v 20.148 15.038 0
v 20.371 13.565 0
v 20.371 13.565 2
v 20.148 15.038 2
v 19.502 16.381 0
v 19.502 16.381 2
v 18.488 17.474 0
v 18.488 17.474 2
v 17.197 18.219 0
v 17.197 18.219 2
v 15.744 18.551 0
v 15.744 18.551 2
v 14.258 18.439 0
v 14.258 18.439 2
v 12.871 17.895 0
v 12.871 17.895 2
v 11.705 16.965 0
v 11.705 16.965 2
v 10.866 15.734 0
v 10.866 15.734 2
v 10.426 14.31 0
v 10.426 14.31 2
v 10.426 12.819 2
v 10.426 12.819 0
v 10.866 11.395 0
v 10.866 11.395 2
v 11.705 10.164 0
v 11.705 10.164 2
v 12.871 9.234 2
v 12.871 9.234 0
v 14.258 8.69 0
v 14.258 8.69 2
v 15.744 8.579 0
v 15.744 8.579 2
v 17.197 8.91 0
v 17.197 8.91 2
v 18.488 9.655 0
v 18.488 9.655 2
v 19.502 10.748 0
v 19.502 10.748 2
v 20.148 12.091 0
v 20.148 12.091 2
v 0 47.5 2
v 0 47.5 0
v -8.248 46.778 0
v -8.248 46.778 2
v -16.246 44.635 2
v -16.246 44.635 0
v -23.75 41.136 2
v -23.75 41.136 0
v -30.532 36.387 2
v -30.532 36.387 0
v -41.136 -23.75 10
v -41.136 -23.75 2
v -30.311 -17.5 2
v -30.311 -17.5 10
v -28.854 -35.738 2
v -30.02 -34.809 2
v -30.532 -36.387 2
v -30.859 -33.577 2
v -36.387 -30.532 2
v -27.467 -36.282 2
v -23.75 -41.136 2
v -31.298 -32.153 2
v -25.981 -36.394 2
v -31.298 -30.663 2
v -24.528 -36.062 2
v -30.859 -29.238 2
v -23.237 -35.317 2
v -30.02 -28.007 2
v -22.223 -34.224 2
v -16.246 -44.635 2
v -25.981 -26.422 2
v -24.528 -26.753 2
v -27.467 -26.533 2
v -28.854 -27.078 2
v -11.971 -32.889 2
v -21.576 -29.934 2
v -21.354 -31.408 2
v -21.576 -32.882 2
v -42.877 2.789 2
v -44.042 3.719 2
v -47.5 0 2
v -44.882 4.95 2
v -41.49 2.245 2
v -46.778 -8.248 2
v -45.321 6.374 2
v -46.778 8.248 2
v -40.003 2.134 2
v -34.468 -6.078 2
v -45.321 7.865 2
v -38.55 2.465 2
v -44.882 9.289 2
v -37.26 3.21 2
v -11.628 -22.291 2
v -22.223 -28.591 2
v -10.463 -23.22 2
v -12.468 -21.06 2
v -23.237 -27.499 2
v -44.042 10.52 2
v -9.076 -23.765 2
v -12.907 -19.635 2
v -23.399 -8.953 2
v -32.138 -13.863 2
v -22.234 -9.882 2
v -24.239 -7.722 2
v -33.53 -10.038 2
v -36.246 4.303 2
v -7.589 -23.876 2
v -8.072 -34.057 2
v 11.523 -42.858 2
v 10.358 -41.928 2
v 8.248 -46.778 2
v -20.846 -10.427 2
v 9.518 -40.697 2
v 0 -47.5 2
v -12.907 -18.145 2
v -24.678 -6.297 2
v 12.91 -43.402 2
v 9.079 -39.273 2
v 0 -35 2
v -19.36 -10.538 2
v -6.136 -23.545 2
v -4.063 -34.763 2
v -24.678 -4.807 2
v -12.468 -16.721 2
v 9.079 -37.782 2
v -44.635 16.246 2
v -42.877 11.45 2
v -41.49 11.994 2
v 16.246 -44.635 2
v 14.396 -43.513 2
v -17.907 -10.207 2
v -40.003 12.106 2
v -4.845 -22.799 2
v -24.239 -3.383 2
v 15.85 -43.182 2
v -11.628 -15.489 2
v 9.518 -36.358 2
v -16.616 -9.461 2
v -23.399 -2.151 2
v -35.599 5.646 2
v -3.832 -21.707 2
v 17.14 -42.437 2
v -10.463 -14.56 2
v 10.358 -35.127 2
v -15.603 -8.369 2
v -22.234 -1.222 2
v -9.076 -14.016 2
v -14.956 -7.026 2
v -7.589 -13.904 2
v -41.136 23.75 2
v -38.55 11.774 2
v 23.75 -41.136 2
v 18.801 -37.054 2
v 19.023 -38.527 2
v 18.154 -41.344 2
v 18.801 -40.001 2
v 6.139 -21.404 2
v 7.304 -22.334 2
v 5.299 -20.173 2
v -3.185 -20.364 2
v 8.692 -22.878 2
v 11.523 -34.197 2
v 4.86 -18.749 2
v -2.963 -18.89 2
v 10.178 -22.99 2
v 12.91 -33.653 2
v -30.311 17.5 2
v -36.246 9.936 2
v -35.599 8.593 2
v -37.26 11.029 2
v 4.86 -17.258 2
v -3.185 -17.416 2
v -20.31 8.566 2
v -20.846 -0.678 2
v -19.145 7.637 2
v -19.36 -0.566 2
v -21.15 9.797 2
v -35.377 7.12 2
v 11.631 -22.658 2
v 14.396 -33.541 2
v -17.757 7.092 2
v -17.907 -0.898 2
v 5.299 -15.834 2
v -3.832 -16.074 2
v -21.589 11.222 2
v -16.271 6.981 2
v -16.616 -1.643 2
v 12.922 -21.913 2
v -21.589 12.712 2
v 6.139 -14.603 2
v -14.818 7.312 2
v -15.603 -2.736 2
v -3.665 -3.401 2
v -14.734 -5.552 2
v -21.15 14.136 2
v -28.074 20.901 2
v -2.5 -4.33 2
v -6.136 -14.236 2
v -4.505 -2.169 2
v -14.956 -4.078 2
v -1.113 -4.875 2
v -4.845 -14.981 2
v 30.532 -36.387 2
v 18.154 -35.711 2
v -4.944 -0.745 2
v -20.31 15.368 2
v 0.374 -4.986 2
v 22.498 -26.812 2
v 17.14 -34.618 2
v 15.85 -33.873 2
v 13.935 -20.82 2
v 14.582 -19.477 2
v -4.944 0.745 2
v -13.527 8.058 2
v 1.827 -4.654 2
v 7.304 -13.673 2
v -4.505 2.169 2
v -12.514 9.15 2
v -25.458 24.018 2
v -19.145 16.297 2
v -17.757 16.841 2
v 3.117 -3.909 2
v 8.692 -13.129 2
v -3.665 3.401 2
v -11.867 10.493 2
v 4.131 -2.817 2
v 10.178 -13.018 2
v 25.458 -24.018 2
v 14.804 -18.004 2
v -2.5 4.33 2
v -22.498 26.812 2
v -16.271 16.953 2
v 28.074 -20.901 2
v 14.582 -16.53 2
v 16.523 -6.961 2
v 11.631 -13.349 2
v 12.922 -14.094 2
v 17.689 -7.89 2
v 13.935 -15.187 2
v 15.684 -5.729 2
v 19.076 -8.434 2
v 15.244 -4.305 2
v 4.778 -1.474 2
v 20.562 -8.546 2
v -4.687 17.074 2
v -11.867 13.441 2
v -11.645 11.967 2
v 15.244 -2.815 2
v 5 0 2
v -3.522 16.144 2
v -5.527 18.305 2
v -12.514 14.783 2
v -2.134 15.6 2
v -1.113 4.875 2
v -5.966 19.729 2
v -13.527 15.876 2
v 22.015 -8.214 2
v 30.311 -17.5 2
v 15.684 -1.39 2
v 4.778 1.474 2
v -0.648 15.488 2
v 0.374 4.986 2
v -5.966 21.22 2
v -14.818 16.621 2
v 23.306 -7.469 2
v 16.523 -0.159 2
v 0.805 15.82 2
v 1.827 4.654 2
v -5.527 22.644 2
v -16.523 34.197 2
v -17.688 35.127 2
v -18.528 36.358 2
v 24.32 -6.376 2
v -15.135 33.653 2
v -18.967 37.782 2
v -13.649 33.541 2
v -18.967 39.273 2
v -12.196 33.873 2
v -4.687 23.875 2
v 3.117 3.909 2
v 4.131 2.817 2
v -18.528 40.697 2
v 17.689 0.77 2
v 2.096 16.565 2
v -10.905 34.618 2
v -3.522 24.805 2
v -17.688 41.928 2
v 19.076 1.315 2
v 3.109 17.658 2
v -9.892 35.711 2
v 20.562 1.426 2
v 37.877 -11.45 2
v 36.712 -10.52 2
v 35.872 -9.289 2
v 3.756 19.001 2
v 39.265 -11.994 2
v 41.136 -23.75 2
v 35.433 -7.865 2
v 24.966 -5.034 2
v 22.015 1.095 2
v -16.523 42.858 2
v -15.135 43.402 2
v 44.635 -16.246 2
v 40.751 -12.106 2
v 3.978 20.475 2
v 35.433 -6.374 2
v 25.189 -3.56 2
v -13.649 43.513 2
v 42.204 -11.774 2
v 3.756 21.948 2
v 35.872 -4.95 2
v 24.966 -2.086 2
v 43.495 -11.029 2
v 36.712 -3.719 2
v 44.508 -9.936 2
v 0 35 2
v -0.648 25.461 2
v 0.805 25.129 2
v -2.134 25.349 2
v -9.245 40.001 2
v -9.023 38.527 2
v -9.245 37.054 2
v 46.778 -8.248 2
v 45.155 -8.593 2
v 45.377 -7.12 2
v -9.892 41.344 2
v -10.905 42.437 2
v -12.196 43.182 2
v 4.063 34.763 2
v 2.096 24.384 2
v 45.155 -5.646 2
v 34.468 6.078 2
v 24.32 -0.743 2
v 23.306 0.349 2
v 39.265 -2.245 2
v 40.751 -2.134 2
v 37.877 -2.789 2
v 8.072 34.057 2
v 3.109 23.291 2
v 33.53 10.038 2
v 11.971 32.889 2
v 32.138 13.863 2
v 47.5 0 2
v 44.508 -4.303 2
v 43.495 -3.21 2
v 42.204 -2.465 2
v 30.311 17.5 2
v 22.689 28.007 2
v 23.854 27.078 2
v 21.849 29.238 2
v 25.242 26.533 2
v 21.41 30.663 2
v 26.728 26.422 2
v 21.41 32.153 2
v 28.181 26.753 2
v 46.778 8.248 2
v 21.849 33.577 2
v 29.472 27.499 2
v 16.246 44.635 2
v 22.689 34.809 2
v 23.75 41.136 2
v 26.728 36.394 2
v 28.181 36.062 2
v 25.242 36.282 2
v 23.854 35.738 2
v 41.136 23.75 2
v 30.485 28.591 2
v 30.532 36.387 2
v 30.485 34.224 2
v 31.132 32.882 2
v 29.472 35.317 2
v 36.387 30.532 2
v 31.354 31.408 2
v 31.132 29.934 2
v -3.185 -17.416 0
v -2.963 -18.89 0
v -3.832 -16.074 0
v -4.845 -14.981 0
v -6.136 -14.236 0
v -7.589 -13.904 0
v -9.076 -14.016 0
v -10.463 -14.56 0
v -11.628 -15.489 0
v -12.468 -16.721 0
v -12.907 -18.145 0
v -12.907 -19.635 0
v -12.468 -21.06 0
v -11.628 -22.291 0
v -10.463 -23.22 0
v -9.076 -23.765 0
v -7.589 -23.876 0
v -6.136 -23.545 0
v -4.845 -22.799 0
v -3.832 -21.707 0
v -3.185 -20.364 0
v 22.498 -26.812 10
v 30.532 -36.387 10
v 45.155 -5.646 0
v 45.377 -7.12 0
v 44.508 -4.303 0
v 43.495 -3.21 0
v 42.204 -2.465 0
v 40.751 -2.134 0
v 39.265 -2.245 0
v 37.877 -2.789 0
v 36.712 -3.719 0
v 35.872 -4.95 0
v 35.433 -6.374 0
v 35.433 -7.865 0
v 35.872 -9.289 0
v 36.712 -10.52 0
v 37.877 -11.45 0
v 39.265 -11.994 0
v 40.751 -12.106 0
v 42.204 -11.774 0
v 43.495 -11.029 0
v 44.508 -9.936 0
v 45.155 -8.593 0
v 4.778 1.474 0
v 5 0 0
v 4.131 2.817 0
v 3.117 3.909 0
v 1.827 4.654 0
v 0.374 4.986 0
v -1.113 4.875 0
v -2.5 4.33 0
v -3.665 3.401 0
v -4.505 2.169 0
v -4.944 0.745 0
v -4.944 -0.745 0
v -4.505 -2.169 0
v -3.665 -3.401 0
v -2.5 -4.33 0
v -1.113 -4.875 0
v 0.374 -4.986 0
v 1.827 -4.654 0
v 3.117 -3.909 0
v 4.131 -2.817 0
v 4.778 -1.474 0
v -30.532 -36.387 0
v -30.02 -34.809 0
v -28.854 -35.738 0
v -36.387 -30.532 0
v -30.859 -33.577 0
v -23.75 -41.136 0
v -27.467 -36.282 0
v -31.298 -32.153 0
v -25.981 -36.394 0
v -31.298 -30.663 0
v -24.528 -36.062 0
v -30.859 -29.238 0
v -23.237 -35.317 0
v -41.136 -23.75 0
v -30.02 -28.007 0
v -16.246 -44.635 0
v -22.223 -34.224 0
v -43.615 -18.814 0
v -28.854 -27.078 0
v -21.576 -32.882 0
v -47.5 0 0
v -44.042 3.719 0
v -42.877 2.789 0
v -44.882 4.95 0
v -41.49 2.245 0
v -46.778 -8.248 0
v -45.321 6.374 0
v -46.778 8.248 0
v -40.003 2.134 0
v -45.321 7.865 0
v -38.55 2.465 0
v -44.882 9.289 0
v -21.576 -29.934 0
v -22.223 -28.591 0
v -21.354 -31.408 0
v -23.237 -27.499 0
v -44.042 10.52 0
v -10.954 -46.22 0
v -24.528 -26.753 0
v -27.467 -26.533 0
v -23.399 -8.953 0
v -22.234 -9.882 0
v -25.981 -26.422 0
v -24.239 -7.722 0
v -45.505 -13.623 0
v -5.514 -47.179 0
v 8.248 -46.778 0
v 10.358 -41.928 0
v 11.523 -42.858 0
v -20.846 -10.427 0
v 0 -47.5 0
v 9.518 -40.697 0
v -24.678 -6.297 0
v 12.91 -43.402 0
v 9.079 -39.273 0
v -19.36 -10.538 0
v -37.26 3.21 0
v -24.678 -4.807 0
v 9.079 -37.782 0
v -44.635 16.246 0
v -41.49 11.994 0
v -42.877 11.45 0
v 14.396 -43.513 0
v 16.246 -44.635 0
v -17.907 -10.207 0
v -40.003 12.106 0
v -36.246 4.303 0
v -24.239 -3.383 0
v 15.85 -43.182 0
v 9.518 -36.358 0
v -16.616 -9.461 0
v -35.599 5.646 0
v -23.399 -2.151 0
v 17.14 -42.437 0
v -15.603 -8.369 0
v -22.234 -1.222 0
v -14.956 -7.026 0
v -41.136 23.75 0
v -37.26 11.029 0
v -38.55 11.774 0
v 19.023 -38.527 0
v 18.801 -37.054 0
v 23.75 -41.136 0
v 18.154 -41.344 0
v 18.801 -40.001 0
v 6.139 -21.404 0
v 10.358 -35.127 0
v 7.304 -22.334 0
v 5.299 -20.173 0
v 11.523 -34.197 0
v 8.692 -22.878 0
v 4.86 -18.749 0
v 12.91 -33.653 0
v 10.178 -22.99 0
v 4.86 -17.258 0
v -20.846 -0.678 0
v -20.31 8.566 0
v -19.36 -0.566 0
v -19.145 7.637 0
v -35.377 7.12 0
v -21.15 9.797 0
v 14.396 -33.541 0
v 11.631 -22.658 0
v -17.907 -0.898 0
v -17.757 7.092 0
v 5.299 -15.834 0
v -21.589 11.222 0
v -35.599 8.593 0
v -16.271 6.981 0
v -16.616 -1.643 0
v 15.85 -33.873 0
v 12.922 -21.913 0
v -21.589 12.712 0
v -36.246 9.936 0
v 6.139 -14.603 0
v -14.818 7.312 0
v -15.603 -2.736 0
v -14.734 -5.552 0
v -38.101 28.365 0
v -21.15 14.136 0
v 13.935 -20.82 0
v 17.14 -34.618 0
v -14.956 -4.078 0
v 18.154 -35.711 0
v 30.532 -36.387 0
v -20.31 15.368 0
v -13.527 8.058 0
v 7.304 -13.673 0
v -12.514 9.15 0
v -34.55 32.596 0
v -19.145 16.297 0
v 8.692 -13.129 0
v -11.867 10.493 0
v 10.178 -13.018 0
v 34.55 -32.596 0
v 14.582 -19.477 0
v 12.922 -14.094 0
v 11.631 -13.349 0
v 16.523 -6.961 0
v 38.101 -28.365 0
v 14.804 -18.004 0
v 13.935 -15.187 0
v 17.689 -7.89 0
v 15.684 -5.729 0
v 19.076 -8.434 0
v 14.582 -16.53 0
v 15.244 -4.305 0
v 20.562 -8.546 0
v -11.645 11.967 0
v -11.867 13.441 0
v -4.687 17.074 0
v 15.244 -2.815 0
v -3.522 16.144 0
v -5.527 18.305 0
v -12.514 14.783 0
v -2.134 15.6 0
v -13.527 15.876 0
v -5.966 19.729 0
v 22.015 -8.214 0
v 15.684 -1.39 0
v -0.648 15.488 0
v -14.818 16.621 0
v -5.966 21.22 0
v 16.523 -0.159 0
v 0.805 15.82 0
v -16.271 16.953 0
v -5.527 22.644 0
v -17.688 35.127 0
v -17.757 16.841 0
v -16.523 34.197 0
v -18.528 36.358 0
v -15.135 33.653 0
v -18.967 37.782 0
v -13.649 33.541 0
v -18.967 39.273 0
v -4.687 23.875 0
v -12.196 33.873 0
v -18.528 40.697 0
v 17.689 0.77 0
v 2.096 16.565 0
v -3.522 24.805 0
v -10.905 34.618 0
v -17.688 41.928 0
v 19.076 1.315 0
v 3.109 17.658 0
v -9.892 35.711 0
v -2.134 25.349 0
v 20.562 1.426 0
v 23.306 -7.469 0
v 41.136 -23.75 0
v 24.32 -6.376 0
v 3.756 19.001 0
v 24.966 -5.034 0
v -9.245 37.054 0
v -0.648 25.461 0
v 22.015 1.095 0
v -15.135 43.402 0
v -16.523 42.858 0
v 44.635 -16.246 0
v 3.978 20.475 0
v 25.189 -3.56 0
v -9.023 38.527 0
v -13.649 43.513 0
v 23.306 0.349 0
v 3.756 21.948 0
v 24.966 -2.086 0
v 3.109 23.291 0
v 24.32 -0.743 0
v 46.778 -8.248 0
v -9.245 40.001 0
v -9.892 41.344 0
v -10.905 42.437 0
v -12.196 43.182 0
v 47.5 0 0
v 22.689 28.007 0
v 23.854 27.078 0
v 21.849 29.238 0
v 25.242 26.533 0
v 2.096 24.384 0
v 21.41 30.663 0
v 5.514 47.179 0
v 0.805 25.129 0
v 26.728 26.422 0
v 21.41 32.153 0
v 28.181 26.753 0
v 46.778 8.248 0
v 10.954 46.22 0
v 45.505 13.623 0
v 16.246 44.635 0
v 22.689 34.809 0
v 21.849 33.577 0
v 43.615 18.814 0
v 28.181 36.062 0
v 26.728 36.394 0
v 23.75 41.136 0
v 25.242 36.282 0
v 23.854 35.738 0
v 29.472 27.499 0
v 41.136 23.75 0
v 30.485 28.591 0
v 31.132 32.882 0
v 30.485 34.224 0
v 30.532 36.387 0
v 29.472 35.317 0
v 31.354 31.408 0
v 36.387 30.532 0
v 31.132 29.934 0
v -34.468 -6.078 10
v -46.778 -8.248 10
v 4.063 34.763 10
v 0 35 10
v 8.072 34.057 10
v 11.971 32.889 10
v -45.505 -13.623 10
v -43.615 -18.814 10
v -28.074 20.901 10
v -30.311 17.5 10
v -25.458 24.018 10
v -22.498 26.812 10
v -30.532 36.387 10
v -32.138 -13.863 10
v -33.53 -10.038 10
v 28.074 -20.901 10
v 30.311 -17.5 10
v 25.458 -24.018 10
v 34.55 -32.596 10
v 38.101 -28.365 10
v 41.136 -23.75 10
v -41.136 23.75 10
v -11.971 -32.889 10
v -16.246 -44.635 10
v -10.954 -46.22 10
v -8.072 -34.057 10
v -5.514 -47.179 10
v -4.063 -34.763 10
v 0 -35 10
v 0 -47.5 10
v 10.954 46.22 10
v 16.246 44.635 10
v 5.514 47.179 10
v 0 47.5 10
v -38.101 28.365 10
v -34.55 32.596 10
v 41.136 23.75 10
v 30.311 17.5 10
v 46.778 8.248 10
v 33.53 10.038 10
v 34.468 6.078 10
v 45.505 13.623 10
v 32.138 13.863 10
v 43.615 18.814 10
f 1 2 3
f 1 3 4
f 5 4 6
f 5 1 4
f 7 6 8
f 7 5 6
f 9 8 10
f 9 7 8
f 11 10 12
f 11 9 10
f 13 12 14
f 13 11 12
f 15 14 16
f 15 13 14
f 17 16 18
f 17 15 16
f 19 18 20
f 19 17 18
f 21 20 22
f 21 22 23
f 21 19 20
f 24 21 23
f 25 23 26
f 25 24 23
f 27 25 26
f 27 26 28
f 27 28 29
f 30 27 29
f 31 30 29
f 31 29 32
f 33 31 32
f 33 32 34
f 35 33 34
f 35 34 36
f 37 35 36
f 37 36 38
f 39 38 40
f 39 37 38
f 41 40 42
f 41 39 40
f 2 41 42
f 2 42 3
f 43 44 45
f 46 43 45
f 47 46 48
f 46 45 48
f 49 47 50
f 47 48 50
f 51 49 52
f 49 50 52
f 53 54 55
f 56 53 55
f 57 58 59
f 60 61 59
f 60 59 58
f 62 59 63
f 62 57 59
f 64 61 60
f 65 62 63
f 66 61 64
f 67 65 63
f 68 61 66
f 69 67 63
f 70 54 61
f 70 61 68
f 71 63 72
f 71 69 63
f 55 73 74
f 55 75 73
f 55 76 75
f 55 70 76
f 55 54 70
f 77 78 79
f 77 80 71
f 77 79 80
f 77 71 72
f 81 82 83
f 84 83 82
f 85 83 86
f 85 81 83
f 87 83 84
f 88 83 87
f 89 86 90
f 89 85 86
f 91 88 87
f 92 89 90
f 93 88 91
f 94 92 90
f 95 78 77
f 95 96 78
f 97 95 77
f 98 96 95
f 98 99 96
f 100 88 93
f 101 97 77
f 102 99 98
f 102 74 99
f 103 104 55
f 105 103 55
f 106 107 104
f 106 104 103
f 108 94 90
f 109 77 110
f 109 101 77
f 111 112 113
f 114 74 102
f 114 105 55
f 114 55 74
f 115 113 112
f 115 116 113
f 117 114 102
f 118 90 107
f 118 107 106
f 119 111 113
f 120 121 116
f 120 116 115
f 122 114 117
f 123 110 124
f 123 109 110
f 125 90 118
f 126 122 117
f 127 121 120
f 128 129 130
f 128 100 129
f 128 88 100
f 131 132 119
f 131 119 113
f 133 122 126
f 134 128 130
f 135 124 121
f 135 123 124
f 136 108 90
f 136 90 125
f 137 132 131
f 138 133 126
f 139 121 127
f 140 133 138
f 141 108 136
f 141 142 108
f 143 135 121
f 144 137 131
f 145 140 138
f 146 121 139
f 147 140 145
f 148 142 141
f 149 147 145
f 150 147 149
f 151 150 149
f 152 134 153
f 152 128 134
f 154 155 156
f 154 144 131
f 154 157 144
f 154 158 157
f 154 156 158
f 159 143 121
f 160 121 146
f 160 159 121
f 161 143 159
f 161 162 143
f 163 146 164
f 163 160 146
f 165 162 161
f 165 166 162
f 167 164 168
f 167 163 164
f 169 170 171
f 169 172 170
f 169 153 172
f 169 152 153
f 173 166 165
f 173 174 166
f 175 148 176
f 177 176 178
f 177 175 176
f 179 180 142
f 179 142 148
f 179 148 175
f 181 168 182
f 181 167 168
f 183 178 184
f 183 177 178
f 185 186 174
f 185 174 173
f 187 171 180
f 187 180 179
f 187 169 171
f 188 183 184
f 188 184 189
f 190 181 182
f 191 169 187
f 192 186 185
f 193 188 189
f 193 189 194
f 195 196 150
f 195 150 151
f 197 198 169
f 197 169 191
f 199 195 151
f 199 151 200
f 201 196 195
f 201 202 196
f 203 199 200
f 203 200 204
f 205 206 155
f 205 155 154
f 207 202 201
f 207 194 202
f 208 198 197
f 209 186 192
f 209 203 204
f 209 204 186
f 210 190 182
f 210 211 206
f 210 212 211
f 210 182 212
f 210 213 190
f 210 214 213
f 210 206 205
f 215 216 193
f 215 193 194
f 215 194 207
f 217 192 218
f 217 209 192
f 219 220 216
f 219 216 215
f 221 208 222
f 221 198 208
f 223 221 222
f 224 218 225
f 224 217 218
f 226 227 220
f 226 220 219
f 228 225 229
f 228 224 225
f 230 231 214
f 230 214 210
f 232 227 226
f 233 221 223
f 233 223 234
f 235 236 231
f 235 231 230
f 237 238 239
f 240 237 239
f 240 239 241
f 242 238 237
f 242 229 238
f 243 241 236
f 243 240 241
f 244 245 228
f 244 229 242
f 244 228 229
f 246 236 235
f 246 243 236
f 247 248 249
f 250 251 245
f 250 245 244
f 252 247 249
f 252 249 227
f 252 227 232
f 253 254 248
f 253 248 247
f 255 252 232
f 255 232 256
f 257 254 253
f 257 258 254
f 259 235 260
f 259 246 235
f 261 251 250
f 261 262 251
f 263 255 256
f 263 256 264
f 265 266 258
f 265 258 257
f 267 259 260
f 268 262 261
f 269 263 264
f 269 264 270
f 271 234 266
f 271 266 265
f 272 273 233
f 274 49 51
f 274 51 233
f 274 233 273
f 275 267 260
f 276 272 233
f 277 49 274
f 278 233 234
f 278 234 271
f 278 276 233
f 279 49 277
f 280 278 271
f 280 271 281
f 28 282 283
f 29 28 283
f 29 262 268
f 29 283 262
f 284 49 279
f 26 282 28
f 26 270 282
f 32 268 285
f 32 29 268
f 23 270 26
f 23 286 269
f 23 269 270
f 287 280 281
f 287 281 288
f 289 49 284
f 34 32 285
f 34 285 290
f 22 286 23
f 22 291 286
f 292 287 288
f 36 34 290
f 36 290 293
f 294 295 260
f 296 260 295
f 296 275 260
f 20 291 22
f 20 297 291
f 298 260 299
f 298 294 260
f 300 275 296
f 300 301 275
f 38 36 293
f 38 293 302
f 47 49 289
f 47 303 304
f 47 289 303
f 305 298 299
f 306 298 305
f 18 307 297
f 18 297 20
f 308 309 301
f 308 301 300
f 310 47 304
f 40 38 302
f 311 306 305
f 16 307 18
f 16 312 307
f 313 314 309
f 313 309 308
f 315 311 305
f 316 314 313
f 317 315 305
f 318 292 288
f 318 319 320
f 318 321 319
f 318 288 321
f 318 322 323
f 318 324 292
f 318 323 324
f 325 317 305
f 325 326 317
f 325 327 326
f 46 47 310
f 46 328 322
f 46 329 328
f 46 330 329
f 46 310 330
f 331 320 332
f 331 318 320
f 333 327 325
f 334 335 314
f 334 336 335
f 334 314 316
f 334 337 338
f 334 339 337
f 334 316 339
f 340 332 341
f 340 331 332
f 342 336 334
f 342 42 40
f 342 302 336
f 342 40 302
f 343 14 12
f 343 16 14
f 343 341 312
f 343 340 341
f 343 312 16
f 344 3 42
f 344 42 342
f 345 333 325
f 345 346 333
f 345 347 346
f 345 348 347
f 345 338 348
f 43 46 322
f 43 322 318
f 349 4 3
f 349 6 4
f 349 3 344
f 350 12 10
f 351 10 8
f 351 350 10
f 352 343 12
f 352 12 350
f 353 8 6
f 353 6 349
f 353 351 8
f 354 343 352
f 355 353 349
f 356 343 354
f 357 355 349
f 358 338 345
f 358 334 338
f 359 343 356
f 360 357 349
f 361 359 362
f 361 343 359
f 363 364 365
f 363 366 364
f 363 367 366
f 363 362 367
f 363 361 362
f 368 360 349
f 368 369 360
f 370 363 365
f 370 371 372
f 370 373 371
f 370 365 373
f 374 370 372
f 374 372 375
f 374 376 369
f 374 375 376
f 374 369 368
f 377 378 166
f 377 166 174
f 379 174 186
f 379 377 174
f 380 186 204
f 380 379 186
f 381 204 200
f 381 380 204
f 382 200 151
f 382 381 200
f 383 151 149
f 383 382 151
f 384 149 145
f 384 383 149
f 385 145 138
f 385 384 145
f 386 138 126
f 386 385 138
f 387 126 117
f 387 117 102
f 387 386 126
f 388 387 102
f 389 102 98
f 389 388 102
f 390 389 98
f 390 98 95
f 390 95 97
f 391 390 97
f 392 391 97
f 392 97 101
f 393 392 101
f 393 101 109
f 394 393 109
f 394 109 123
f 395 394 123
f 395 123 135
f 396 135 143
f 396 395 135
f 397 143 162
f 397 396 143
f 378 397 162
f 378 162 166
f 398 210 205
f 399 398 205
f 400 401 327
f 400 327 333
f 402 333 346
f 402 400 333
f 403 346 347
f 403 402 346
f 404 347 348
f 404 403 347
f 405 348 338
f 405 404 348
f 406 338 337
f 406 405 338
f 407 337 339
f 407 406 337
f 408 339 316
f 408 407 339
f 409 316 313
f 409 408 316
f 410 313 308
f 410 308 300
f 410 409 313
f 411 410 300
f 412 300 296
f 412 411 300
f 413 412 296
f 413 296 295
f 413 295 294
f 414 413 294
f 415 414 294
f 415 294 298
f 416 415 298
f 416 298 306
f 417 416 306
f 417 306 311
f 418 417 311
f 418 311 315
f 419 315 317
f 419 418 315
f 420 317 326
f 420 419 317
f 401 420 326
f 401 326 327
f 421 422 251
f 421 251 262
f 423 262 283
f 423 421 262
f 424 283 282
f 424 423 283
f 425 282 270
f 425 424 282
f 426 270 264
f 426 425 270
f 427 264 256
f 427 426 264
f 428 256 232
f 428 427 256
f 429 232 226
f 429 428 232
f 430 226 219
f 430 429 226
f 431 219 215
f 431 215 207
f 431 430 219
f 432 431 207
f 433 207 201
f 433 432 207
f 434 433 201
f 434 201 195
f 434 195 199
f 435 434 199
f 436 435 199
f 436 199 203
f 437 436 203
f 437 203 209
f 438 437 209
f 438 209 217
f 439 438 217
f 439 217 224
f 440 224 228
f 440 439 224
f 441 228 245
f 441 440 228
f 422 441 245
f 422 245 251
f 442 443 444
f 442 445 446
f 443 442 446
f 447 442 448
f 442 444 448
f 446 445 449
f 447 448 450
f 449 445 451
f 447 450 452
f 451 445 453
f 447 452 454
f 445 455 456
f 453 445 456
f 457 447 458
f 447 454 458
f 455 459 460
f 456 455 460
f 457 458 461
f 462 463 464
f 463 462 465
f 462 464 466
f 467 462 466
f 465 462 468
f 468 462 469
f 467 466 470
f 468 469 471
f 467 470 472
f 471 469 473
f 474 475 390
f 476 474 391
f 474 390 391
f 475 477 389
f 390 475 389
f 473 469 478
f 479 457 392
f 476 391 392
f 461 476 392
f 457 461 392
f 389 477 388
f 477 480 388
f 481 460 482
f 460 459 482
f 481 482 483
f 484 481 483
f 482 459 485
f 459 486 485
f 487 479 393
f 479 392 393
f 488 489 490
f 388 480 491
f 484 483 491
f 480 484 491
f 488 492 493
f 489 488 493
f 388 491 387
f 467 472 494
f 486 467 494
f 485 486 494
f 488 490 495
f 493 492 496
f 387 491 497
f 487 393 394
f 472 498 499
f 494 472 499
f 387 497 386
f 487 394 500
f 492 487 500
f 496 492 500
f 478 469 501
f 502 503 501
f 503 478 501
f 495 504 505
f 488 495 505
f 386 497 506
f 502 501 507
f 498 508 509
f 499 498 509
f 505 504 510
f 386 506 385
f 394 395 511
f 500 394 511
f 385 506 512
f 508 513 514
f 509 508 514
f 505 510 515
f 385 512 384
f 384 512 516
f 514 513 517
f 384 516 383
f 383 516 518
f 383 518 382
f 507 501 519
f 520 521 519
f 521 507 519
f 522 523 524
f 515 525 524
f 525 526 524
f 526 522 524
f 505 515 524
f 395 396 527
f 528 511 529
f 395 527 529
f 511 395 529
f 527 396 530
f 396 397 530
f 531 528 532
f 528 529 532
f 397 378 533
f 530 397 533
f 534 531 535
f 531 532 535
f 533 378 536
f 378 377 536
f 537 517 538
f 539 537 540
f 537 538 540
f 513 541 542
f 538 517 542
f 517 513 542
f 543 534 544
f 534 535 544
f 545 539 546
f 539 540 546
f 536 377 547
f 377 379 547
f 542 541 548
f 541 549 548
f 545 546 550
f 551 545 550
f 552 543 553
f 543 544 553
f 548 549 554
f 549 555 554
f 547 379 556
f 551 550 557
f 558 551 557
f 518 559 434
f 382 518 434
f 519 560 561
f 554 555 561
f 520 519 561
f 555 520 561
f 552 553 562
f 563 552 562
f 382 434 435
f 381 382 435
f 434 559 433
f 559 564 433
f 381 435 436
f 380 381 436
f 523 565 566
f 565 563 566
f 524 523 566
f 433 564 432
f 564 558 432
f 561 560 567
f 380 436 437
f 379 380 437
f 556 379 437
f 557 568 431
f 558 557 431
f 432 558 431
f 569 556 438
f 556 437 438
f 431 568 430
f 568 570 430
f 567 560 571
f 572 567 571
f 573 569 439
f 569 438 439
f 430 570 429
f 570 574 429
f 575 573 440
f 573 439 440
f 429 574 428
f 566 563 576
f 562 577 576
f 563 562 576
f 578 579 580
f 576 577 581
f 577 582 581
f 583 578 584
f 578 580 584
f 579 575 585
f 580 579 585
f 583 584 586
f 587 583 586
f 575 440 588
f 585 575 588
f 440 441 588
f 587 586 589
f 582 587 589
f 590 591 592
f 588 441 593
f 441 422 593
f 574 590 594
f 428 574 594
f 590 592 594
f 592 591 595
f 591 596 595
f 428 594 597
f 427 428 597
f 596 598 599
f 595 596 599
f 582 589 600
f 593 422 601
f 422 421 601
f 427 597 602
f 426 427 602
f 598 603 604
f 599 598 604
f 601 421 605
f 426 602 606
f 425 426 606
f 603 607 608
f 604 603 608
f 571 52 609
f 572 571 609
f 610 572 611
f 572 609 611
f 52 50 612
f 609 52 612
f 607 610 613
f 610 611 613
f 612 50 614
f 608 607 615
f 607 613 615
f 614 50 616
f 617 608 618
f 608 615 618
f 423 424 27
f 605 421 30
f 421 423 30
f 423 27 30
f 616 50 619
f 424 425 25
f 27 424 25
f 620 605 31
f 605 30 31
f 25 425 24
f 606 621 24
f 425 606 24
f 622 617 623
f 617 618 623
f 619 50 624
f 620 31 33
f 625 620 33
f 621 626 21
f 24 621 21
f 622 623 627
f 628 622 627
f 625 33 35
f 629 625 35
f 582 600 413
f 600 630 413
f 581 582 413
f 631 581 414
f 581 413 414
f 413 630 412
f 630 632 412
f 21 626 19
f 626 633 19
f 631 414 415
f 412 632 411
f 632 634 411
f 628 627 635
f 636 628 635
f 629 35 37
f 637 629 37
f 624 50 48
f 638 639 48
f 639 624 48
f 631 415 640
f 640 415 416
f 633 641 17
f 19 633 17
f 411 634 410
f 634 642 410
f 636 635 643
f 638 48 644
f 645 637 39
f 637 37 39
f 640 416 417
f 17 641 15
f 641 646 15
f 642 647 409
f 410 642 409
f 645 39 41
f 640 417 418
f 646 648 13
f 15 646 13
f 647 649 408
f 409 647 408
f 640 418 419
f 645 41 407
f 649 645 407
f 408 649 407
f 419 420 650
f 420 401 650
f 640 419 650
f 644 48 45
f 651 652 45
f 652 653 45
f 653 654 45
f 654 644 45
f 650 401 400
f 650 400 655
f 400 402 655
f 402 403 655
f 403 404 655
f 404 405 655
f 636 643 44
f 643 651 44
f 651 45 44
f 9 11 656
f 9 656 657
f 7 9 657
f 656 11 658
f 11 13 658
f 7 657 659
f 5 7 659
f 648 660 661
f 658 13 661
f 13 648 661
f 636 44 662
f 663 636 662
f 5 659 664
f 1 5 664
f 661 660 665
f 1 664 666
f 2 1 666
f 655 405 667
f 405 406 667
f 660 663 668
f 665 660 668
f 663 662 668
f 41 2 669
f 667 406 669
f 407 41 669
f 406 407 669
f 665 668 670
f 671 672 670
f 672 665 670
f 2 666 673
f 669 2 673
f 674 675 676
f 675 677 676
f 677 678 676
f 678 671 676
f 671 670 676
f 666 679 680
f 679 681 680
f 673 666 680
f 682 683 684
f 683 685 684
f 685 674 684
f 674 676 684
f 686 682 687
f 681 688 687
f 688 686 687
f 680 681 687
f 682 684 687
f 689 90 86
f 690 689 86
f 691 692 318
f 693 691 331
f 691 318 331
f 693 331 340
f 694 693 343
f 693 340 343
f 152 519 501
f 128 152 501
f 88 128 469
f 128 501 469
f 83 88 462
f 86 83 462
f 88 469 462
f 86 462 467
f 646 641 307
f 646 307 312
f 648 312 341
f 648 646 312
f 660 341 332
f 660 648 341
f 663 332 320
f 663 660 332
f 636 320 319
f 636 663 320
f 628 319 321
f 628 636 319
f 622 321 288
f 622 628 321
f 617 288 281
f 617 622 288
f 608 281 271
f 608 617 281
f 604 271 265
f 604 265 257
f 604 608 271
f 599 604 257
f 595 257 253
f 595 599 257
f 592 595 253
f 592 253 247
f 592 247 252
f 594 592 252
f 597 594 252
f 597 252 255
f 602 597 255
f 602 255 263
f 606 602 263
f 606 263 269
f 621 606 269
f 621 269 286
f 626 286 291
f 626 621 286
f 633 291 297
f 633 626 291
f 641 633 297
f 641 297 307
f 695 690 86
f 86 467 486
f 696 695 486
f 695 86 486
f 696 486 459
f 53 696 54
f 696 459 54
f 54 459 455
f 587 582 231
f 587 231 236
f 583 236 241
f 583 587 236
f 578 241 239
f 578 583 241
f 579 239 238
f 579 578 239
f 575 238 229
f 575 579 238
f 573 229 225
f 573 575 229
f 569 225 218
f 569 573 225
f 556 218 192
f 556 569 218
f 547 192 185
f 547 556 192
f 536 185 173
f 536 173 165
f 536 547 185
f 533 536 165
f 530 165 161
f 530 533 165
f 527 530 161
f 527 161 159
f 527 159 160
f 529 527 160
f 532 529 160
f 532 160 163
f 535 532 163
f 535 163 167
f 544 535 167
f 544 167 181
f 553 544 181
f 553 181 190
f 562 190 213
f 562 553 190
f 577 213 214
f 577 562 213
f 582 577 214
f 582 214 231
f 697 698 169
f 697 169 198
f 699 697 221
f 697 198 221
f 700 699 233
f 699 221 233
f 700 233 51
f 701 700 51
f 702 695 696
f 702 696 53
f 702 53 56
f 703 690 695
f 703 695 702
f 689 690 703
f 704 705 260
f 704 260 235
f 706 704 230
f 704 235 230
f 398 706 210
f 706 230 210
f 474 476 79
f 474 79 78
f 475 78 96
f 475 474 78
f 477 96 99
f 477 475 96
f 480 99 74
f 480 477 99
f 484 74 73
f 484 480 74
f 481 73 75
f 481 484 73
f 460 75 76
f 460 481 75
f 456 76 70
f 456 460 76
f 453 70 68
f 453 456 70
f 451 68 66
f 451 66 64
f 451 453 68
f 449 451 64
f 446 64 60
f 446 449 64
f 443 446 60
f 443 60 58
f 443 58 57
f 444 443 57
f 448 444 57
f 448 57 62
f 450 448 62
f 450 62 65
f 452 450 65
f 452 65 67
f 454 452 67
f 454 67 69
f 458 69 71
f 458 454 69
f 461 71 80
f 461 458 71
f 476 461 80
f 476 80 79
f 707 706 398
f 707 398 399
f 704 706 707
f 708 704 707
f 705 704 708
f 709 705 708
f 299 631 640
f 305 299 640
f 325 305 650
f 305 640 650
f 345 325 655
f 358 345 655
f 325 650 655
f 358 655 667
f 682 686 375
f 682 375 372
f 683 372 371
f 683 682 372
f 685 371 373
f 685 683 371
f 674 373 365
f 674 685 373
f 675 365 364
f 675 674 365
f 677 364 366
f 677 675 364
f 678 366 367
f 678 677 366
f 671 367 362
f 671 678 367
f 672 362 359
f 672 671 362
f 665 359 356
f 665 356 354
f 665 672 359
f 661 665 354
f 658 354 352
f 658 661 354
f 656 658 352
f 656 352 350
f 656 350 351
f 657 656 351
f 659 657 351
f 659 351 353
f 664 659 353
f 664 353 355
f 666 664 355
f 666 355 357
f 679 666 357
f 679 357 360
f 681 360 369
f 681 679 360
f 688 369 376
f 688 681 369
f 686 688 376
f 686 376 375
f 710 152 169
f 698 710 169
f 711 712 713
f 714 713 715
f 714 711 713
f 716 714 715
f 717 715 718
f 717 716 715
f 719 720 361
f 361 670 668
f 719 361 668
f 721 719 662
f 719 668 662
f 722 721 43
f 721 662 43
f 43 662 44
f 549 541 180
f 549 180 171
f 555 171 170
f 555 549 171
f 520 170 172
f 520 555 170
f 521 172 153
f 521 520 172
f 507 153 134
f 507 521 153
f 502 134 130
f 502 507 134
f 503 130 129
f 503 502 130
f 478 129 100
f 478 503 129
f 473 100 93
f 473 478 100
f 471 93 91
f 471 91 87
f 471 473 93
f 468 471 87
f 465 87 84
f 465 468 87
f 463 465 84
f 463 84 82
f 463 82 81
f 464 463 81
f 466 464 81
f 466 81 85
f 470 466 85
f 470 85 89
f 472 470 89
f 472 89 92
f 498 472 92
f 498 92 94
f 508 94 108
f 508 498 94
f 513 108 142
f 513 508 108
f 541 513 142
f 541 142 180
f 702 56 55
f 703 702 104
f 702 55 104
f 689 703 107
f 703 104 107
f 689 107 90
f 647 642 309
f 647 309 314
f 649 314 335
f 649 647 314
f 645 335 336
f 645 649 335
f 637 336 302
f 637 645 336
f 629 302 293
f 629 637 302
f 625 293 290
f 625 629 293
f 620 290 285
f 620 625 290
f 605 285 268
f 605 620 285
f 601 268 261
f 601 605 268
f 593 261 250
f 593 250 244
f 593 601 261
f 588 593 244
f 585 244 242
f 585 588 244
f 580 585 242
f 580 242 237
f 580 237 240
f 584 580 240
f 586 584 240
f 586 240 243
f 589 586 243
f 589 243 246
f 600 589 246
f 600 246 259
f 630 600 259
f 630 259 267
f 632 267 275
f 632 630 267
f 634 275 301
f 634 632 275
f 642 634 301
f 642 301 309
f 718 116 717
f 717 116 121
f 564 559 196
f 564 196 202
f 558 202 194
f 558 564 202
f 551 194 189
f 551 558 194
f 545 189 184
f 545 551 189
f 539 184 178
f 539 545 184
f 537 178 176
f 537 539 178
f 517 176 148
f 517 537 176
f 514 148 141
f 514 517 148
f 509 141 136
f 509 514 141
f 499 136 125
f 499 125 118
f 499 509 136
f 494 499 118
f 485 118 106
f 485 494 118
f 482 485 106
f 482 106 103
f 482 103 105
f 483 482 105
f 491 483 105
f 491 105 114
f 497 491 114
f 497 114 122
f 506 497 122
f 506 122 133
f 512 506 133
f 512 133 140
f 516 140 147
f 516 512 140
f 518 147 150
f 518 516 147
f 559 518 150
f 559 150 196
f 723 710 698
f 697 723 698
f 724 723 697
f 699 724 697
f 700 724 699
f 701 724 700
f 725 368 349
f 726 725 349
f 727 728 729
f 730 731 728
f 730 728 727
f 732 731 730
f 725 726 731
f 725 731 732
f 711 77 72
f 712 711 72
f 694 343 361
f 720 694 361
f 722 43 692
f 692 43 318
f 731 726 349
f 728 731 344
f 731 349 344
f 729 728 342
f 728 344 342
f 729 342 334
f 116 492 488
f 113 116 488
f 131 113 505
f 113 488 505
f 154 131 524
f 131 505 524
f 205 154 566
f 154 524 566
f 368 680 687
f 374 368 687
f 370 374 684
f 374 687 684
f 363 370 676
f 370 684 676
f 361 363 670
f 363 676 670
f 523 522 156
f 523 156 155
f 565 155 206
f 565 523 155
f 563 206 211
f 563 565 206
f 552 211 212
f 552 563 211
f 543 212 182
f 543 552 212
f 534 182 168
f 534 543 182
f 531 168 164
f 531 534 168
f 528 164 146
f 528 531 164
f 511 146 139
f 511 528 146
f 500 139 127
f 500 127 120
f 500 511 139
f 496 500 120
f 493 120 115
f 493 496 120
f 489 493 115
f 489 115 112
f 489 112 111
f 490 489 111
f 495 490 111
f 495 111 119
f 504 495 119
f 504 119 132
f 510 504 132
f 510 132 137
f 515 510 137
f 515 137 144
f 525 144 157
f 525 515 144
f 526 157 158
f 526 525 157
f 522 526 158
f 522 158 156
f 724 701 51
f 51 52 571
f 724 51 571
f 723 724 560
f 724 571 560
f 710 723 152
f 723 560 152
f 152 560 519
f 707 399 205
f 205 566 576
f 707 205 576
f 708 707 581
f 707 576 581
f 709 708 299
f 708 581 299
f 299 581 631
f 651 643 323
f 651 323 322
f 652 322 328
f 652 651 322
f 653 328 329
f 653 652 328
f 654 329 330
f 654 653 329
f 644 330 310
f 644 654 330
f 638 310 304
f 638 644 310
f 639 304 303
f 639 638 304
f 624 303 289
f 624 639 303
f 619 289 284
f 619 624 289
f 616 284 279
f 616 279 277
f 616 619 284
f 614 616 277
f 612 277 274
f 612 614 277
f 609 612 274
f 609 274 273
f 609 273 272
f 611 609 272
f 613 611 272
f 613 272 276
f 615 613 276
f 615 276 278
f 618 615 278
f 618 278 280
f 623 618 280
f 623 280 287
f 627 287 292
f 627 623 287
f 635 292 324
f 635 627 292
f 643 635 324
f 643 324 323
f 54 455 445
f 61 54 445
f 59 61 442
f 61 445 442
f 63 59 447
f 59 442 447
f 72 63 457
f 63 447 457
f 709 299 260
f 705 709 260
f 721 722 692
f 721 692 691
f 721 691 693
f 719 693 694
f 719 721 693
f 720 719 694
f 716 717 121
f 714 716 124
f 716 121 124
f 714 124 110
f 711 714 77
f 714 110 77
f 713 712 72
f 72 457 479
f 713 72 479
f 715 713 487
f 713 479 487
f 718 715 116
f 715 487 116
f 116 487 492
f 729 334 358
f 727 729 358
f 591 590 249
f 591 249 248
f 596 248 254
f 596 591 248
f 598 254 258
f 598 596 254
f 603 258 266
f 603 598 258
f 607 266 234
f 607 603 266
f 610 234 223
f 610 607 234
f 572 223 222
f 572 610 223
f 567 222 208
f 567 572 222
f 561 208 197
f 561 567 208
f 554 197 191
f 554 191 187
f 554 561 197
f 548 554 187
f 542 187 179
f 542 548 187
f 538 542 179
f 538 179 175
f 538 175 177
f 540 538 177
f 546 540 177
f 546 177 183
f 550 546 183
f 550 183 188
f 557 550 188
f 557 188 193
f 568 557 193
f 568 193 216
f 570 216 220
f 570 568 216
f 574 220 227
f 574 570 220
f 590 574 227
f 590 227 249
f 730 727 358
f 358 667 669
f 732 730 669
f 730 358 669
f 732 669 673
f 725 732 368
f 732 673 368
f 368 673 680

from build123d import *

# Parameters (mm, degrees)
SKETCH1_R           = 5
BOSS_EXTRUDE1_DEPTH = 2
BOSS_EXTRUDE2_DEPTH = 10


with BuildPart() as part:
    # Sketch1 → Boss-Extrude1 (new body)
    with BuildSketch(Plane.XY):
        with BuildLine():
            ThreePointArc((0, 47.5), (-16.245956808, 44.635399487), (-30.53241146, 36.387111048))
            Line((-30.53241146, 36.387111048), (-22.497566339, 26.811555509))
            ThreePointArc((-22.497566339, 26.811555509), (-26.811555509, 22.497566339), (-30.310889132, 17.5))
            Line((-30.310889132, 17.5), (-41.13620668, 23.75))
            ThreePointArc((-41.13620668, 23.75), (-46.778368268, 8.248288439), (-46.778368268, -8.248288439))
            Line((-46.778368268, -8.248288439), (-34.468271355, -6.077686218))
            ThreePointArc((-34.468271355, -6.077686218), (-32.889241728, -11.970705016), (-30.310889132, -17.5))
            Line((-30.310889132, -17.5), (-41.13620668, -23.75))
            ThreePointArc((-41.13620668, -23.75), (-30.53241146, -36.387111048), (-16.245956808, -44.635399487))
            Line((-16.245956808, -44.635399487), (-11.970705016, -32.889241728))
            ThreePointArc((-11.970705016, -32.889241728), (-6.077686218, -34.468271355), (0, -35))
            Line((0, -35), (0, -47.5))
            ThreePointArc((0, -47.5), (16.245956808, -44.635399487), (30.53241146, -36.387111048))
            Line((30.53241146, -36.387111048), (22.497566339, -26.811555509))
            ThreePointArc((22.497566339, -26.811555509), (26.811555509, -22.497566339), (30.310889132, -17.5))
            Line((30.310889132, -17.5), (41.13620668, -23.75))
            ThreePointArc((41.13620668, -23.75), (46.778368268, -8.248288439), (46.778368268, 8.248288439))
            Line((46.778368268, 8.248288439), (34.468271355, 6.077686218))
            ThreePointArc((34.468271355, 6.077686218), (32.889241728, 11.970705016), (30.310889132, 17.5))
            Line((30.310889132, 17.5), (41.13620668, 23.75))
            ThreePointArc((41.13620668, 23.75), (30.53241146, 36.387111048), (16.245956808, 44.635399487))
            Line((16.245956808, 44.635399487), (11.970705016, 32.889241728))
            ThreePointArc((11.970705016, 32.889241728), (6.077686218, 34.468271355), (0, 35))
            Line((0, 35), (0, 47.5))
        make_face()
        with Locations((-14.022825876, 38.527397452)):
            Circle(SKETCH1_R, mode=Mode.SUBTRACT)
        with Locations((15.370514661, 13.564559671)):
            Circle(SKETCH1_R, mode=Mode.SUBTRACT)
        with Locations((-7.962913324, -18.890262343)):
            Circle(SKETCH1_R, mode=Mode.SUBTRACT)
        with Locations((-19.733797062, -5.552229597)):
            Circle(SKETCH1_R, mode=Mode.SUBTRACT)
        with Locations((9.804206562, -18.003542254)):
            Circle(SKETCH1_R, mode=Mode.SUBTRACT)
        with Locations((20.188558937, -3.559787642)):
            Circle(SKETCH1_R, mode=Mode.SUBTRACT)
        with Locations((-16.644729117, 11.966745281)):
            Circle(SKETCH1_R, mode=Mode.SUBTRACT)
        with Locations((-1.021840656, 20.474516885)):
            Circle(SKETCH1_R, mode=Mode.SUBTRACT)
        Circle(SKETCH1_R, mode=Mode.SUBTRACT)
        with Locations((26.354291997, 31.407822168)):
            Circle(SKETCH1_R, mode=Mode.SUBTRACT)
        with Locations((40.377117874, -7.119575284)):
            Circle(SKETCH1_R, mode=Mode.SUBTRACT)
        with Locations((14.022825876, -38.527397452)):
            Circle(SKETCH1_R, mode=Mode.SUBTRACT)
        with Locations((-26.354291997, -31.407822168)):
            Circle(SKETCH1_R, mode=Mode.SUBTRACT)
        with Locations((-40.377117874, 7.119575284)):
            Circle(SKETCH1_R, mode=Mode.SUBTRACT)
    extrude(amount=BOSS_EXTRUDE1_DEPTH)

    # Sketch1<3> → Boss-Extrude2 (add)
    with BuildSketch(Plane.XY):
        with BuildLine():
            Line((0, 47.5), (0, 35))
            ThreePointArc((0, 35), (6.077686218, 34.468271355), (11.970705016, 32.889241728))
            Line((11.970705016, 32.889241728), (16.245956808, 44.635399487))
            ThreePointArc((16.245956808, 44.635399487), (8.248288439, 46.778368268), (0, 47.5))
        make_face()
        with BuildLine():
            ThreePointArc((-30.310889132, 17.5), (-26.811555509, 22.497566339), (-22.497566339, 26.811555509))
            Line((-22.497566339, 26.811555509), (-30.53241146, 36.387111048))
            ThreePointArc((-30.53241146, 36.387111048), (-36.387111048, 30.53241146), (-41.13620668, 23.75))
            Line((-41.13620668, 23.75), (-30.310889132, 17.5))
        make_face()
        with BuildLine():
            Line((41.13620668, 23.75), (30.310889132, 17.5))
            ThreePointArc((30.310889132, 17.5), (32.889241728, 11.970705016), (34.468271355, 6.077686218))
            Line((34.468271355, 6.077686218), (46.778368268, 8.248288439))
            ThreePointArc((46.778368268, 8.248288439), (44.635399487, 16.245956808), (41.13620668, 23.75))
        make_face()
        with BuildLine():
            ThreePointArc((-30.310889132, -17.5), (-32.889241728, -11.970705016), (-34.468271355, -6.077686218))
            Line((-34.468271355, -6.077686218), (-46.778368268, -8.248288439))
            ThreePointArc((-46.778368268, -8.248288439), (-44.635399487, -16.245956808), (-41.13620668, -23.75))
            Line((-41.13620668, -23.75), (-30.310889132, -17.5))
        make_face()
        with BuildLine():
            Line((41.13620668, -23.75), (30.310889132, -17.5))
            ThreePointArc((30.310889132, -17.5), (26.811555509, -22.497566339), (22.497566339, -26.811555509))
            Line((22.497566339, -26.811555509), (30.53241146, -36.387111048))
            ThreePointArc((30.53241146, -36.387111048), (36.387111048, -30.53241146), (41.13620668, -23.75))
        make_face()
        with BuildLine():
            ThreePointArc((0, -35), (-6.077686218, -34.468271355), (-11.970705016, -32.889241728))
            Line((-11.970705016, -32.889241728), (-16.245956808, -44.635399487))
            ThreePointArc((-16.245956808, -44.635399487), (-8.248288439, -46.778368268), (0, -47.5))
            Line((0, -47.5), (0, -35))
        make_face()
    extrude(amount=BOSS_EXTRUDE2_DEPTH)


solid = part.part
